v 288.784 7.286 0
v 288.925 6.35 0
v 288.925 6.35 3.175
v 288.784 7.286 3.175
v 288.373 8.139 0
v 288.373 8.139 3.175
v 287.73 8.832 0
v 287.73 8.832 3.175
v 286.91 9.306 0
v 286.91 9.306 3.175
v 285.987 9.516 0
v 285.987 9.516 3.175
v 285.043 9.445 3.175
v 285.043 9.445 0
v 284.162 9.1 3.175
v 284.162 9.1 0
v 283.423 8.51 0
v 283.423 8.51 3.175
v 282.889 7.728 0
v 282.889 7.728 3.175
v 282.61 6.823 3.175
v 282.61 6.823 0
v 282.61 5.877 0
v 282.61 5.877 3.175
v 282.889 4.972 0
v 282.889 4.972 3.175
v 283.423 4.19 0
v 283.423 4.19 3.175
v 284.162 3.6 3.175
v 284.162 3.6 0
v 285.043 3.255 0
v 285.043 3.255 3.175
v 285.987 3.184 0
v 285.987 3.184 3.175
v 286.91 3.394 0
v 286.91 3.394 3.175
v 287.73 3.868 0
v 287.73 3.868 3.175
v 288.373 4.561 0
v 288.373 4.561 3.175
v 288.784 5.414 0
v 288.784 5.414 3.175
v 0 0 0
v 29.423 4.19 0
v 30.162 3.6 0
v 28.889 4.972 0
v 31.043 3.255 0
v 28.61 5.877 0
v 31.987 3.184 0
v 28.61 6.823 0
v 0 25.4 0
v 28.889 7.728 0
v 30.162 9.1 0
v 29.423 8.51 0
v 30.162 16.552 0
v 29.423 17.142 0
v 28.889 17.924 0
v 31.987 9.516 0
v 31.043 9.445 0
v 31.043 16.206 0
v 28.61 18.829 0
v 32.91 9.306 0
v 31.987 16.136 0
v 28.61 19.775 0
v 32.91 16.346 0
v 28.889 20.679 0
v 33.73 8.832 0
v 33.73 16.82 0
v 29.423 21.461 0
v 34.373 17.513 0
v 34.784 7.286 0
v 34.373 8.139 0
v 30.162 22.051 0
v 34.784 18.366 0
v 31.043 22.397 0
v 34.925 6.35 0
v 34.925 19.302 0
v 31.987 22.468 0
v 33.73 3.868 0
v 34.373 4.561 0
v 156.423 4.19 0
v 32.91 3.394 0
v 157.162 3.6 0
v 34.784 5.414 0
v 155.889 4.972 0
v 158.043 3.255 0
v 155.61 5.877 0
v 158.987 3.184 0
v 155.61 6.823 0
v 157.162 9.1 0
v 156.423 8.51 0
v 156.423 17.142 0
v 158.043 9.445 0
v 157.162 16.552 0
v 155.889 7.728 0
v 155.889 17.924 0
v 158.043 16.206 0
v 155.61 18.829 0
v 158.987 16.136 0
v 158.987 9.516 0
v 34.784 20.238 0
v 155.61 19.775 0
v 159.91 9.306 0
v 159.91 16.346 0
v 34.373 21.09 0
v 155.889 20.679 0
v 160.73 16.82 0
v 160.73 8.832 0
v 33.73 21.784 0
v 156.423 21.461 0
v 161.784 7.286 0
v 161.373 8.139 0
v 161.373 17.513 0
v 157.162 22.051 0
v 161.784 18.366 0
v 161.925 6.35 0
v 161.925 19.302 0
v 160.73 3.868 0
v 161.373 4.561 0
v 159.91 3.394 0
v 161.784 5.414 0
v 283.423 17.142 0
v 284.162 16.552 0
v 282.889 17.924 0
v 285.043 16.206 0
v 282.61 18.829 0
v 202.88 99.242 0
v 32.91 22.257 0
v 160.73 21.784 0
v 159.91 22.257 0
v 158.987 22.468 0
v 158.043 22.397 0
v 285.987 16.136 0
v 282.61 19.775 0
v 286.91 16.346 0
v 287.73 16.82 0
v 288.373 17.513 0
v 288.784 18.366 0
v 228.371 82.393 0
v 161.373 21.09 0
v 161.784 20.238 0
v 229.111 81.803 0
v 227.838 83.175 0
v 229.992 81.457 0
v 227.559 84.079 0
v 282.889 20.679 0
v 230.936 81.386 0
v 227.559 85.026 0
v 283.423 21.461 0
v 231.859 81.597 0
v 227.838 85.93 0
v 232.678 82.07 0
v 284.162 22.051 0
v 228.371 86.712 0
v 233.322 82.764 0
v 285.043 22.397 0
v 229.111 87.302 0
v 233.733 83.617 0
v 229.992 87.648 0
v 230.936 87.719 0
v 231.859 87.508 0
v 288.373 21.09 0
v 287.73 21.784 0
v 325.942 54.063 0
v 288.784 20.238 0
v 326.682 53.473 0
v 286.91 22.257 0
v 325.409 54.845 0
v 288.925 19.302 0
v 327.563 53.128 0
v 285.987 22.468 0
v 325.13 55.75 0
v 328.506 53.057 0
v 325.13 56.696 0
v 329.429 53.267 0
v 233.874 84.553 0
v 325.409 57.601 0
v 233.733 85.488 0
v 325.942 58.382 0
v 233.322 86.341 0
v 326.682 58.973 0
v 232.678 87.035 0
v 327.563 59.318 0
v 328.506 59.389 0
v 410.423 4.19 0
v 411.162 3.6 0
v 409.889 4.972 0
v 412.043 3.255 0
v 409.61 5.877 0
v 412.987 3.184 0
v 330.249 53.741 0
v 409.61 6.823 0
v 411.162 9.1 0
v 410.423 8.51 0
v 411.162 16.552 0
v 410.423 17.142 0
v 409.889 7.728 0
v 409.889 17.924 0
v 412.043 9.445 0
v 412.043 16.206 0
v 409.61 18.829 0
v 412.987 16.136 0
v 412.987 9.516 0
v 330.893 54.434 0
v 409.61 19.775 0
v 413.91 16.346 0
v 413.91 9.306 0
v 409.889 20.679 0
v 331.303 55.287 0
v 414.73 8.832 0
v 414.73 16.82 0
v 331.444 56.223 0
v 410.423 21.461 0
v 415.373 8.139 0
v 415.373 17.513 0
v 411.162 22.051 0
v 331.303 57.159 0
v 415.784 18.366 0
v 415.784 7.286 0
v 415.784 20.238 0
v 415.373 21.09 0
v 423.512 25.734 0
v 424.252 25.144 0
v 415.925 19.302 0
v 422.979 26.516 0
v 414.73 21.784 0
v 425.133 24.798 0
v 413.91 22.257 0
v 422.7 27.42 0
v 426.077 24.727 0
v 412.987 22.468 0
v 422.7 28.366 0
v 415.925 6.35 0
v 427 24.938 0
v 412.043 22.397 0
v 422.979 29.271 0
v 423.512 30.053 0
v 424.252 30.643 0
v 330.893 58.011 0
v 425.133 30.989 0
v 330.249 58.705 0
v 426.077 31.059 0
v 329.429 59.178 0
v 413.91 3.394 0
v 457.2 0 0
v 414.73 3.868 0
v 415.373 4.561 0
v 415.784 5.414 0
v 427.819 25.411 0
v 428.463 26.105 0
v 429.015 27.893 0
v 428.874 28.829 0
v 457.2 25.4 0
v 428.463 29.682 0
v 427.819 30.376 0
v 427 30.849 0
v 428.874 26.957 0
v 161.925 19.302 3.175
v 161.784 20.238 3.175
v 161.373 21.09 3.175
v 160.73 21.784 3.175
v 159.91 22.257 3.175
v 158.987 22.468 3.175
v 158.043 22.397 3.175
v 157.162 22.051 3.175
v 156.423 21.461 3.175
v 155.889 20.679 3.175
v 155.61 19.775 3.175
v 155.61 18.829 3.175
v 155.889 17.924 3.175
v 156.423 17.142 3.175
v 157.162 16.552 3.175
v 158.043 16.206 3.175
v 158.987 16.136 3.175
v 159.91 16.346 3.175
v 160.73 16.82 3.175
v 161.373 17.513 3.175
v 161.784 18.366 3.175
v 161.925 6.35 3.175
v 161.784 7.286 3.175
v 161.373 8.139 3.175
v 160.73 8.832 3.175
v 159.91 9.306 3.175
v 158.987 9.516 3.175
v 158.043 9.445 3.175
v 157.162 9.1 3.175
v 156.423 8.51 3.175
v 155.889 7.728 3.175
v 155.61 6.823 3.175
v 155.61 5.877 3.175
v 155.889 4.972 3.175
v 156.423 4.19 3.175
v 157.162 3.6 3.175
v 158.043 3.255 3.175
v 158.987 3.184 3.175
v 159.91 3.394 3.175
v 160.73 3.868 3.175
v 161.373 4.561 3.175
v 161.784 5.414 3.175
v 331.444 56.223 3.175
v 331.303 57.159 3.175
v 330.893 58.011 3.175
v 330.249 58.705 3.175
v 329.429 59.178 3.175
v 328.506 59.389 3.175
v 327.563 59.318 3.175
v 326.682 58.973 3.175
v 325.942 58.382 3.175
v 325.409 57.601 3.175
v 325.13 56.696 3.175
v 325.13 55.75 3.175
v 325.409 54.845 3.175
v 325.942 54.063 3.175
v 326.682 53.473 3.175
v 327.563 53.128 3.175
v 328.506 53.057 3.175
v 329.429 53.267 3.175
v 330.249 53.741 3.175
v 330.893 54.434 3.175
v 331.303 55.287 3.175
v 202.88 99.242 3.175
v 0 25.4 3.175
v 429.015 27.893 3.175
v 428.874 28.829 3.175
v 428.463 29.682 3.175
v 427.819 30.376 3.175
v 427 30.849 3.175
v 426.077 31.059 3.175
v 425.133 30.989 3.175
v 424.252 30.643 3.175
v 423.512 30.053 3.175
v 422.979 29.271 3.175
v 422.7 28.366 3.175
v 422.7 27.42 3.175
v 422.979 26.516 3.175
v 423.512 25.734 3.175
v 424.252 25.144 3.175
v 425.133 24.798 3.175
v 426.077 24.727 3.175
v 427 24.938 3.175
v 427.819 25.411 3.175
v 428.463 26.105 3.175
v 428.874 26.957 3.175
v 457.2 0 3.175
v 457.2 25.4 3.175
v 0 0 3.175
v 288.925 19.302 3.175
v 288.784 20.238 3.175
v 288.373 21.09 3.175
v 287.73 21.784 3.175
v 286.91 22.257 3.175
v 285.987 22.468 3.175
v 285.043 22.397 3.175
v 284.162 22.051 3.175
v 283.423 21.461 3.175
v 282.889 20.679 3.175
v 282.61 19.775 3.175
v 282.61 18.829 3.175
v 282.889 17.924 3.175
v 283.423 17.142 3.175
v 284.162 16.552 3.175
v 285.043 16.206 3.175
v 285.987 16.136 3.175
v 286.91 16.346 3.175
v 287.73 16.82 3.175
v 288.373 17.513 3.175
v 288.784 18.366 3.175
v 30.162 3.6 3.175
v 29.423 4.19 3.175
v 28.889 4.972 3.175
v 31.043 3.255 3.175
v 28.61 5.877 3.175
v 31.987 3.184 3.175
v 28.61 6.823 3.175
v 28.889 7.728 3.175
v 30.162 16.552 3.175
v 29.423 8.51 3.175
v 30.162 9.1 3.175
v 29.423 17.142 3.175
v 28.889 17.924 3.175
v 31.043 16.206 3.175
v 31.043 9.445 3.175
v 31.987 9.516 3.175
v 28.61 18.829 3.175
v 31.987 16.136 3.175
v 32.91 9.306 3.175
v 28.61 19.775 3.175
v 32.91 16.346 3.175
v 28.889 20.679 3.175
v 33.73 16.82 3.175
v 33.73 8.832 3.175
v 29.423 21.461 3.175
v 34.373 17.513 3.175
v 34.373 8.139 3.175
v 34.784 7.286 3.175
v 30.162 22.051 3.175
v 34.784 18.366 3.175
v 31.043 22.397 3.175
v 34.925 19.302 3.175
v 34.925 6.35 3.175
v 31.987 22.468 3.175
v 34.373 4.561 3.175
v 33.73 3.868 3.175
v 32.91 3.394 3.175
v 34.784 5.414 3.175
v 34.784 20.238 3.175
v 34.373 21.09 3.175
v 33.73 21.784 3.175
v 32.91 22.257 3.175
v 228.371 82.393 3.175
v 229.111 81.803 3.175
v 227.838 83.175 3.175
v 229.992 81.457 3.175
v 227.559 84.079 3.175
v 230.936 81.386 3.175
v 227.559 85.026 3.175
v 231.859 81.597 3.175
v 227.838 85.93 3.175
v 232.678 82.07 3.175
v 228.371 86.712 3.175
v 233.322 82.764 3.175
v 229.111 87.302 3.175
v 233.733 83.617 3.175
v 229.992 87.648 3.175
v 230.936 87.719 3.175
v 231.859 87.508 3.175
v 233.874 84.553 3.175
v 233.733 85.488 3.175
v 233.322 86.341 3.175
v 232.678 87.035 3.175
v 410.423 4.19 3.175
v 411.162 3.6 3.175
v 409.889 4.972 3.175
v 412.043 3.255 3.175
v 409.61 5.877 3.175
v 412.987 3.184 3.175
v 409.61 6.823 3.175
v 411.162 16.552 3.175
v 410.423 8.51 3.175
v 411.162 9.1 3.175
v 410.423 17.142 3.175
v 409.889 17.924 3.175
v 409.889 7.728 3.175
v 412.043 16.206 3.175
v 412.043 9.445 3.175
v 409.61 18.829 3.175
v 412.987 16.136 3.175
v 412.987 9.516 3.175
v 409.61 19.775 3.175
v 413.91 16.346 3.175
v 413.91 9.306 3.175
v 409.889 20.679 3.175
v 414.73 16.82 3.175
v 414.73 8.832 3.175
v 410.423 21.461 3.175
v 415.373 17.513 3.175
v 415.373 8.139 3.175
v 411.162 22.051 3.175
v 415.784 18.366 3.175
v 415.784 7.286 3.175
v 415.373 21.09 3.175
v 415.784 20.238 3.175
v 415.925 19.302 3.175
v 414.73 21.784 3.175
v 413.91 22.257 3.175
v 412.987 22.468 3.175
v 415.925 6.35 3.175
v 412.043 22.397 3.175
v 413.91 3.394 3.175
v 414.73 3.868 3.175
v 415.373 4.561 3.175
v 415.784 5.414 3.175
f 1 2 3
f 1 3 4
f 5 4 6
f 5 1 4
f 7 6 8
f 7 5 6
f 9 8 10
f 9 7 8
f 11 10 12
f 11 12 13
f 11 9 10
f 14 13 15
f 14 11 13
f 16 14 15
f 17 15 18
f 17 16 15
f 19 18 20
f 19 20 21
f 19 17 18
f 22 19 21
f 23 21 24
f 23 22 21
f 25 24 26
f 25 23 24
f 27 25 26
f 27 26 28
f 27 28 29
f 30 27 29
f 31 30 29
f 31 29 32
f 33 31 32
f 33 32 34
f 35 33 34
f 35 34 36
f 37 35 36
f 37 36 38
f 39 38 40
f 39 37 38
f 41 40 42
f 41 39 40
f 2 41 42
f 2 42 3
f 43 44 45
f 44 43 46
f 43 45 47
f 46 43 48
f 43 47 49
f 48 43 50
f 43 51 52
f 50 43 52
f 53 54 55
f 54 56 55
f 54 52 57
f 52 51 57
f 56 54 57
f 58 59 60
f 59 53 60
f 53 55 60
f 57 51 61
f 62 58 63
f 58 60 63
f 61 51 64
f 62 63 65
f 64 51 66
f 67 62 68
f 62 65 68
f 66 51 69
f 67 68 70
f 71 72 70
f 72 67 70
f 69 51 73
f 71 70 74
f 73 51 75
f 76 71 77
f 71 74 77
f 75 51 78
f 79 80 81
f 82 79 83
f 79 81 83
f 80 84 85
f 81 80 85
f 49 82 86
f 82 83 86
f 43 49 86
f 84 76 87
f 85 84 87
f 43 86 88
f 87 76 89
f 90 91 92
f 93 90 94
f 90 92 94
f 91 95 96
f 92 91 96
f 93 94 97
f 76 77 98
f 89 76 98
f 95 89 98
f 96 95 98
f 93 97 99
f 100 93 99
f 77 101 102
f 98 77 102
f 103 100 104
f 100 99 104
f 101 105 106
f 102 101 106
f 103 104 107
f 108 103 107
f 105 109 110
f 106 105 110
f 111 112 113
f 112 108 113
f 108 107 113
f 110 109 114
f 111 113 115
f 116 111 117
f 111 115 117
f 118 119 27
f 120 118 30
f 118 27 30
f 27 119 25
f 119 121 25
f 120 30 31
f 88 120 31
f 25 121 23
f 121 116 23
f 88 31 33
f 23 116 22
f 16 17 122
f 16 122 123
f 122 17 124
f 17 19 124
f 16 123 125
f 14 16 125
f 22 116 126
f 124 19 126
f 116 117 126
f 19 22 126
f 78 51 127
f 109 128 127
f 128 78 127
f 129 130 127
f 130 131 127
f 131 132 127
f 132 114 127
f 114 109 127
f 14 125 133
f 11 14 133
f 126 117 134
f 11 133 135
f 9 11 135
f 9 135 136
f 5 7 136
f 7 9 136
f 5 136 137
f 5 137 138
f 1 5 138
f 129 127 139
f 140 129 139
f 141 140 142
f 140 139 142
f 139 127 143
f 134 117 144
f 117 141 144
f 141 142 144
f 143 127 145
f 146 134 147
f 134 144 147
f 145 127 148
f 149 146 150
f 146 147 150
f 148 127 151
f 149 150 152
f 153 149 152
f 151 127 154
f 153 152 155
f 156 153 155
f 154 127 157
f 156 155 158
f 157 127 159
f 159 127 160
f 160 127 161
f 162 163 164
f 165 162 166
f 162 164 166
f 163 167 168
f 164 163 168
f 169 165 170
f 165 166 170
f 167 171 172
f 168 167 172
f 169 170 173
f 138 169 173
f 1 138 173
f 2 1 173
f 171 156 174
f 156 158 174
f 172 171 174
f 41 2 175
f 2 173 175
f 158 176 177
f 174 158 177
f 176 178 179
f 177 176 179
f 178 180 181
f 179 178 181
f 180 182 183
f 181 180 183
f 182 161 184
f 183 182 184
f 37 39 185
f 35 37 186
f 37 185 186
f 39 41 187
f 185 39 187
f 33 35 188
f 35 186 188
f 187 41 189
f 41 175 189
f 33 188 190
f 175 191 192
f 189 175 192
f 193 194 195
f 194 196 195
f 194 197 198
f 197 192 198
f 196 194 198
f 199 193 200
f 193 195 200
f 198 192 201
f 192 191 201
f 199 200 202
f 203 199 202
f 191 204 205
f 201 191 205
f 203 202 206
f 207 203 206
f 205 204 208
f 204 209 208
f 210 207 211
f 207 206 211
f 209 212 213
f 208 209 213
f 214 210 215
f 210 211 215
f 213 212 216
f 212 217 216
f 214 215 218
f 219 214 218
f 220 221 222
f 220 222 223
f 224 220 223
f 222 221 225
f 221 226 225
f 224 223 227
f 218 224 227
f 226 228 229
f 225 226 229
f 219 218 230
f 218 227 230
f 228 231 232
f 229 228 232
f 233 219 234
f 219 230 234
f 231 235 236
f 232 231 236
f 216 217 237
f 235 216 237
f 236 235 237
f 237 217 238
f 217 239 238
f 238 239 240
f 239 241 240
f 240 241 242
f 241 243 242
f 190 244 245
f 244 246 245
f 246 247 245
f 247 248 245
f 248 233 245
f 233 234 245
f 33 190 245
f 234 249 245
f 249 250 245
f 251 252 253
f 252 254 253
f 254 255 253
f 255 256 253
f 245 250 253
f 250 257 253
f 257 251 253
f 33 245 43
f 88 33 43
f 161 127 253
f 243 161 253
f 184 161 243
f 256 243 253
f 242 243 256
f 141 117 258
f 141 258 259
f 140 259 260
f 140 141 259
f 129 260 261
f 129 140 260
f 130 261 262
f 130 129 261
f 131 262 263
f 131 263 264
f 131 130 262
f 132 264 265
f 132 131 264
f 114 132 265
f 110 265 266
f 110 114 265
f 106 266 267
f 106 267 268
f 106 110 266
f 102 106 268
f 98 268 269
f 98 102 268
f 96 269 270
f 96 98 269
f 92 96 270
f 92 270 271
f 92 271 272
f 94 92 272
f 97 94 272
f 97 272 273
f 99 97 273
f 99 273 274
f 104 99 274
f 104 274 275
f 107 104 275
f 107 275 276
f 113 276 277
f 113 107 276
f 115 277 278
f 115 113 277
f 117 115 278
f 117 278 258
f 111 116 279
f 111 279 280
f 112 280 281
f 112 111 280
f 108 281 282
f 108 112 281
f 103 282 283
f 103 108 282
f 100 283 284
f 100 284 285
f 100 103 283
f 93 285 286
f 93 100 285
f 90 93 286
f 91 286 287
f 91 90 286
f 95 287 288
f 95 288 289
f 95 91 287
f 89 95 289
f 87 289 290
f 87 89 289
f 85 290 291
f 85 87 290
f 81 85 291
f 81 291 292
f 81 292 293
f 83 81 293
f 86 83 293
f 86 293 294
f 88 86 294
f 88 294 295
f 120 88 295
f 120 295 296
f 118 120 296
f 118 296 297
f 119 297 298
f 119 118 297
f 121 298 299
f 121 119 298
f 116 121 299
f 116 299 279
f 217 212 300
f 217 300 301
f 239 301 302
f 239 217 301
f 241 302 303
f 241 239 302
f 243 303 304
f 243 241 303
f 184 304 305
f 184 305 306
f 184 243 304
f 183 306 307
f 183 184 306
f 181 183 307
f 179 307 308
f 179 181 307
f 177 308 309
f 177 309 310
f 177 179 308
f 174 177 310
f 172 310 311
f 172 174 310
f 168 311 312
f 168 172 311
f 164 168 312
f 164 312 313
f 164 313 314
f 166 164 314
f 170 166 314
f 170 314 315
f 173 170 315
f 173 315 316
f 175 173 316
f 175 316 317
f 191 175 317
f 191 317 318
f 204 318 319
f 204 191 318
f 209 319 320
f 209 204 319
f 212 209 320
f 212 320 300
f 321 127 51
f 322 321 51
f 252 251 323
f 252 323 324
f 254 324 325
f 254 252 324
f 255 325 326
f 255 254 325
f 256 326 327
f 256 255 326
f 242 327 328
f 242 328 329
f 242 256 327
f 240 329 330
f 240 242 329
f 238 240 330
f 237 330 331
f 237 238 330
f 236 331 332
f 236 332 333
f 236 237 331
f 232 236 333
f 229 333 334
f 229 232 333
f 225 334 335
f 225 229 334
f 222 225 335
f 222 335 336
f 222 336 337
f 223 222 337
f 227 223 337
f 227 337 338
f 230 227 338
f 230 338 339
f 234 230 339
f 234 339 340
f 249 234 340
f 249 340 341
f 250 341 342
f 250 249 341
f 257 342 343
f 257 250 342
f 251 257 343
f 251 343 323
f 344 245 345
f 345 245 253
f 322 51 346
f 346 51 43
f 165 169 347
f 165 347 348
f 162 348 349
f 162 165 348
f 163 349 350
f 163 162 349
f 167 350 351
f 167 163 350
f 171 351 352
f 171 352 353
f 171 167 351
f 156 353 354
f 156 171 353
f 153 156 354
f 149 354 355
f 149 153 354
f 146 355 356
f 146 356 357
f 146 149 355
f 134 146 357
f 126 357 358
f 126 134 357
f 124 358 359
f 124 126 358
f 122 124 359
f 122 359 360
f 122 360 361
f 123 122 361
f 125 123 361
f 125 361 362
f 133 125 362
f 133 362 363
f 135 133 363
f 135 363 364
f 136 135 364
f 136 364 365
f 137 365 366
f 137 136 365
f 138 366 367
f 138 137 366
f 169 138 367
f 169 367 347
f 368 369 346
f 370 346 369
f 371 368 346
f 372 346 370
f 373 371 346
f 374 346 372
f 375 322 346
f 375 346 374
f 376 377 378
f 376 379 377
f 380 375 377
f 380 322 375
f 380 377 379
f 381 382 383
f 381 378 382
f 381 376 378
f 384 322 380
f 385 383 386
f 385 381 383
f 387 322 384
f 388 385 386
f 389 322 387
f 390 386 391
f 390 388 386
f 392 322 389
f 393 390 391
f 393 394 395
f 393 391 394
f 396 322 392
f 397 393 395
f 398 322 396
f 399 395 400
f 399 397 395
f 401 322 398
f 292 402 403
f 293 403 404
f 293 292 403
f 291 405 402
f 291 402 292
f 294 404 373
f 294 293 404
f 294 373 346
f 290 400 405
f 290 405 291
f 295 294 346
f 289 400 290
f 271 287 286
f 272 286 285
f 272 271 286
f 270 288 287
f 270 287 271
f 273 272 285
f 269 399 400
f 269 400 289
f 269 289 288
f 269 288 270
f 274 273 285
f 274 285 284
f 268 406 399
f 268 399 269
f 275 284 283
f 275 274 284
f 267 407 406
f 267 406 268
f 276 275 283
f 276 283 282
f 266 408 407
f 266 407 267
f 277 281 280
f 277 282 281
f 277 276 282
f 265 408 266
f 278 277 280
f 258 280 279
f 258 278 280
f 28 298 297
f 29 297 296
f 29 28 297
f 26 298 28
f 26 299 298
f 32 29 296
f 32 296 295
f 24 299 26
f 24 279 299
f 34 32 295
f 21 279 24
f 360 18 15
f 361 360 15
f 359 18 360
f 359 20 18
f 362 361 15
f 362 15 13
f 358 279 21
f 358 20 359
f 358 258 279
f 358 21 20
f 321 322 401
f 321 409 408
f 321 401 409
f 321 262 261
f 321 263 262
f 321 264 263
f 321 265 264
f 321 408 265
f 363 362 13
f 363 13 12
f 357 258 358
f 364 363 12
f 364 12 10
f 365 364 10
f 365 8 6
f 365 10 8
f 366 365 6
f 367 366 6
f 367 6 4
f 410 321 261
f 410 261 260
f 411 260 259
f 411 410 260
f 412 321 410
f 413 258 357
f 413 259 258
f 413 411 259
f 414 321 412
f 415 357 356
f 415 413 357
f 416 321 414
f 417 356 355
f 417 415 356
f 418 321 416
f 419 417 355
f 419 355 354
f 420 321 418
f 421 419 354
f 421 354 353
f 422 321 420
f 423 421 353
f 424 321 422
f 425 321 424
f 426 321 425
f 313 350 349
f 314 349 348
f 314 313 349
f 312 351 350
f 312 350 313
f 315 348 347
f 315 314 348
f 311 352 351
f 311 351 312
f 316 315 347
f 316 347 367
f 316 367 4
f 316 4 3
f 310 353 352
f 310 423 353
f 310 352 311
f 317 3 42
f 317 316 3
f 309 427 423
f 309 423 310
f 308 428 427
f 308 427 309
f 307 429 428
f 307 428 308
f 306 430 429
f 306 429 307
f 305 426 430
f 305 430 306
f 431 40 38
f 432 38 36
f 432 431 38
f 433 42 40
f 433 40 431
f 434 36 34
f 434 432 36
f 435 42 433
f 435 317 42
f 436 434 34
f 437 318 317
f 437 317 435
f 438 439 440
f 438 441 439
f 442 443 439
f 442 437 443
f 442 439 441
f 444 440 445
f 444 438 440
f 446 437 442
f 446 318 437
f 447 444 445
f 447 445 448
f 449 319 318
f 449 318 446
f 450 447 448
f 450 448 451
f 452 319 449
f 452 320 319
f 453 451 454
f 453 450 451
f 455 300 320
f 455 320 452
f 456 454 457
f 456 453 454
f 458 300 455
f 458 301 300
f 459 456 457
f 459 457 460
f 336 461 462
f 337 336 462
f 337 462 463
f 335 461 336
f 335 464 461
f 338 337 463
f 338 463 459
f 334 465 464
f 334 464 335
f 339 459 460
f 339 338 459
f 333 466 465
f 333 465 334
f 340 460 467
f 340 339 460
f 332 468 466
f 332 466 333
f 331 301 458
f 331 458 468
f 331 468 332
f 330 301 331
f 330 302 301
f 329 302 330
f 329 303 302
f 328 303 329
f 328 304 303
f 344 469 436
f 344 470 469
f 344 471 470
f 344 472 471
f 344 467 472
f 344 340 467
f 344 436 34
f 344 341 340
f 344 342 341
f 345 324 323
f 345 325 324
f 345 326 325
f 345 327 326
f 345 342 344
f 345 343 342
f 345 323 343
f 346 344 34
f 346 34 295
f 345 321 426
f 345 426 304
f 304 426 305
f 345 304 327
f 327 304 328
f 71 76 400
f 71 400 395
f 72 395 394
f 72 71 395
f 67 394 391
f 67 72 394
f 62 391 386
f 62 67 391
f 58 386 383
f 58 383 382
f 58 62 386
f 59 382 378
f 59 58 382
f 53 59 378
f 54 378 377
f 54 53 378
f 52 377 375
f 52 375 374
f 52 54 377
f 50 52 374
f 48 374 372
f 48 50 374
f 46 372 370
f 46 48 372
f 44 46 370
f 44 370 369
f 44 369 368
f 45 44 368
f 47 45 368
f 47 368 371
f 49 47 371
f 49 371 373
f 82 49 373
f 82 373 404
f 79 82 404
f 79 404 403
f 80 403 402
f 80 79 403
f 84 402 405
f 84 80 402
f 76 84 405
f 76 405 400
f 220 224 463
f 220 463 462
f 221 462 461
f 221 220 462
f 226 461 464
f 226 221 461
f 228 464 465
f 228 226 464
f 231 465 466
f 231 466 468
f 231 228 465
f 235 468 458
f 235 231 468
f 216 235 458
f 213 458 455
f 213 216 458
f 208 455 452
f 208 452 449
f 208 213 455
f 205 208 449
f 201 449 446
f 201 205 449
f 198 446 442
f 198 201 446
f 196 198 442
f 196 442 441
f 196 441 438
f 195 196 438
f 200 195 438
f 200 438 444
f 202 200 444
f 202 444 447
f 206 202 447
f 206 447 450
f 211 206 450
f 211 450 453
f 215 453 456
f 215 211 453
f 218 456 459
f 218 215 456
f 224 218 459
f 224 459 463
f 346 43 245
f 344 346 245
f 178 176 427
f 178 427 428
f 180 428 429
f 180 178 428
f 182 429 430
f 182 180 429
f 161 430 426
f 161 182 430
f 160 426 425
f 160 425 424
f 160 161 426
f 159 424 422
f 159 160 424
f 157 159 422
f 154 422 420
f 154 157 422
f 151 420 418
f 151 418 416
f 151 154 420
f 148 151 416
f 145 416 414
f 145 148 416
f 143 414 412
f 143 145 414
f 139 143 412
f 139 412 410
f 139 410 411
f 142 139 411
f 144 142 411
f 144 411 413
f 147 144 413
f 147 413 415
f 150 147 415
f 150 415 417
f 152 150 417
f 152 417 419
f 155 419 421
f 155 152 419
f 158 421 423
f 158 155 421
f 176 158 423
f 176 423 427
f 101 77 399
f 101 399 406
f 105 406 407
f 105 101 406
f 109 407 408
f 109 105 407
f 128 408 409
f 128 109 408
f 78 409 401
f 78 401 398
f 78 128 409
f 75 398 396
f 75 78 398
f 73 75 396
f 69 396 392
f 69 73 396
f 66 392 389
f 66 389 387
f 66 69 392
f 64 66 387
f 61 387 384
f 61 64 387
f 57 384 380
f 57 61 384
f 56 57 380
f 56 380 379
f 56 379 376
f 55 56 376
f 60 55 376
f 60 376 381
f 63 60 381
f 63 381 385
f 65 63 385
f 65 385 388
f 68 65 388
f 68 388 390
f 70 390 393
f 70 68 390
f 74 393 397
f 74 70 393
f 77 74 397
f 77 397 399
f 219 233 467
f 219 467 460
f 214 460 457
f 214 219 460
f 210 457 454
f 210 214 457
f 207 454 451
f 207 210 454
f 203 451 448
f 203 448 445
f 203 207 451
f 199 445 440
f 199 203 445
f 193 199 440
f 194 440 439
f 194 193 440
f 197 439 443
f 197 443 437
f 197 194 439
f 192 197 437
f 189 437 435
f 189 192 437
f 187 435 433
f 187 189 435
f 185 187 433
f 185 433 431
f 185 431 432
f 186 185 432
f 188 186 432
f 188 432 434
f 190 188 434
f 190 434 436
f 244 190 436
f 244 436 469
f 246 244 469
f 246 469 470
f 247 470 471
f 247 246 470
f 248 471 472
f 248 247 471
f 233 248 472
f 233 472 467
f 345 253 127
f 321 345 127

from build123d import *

# Parameters (mm, degrees)
SKETCH1_R           = 3.175
BOSS_EXTRUDE1_DEPTH = 3.175


with BuildPart() as part:
    # Sketch1 → Boss-Extrude1 (new body)
    with BuildSketch(Plane.XY):
        Polygon((0, 0), (457.2, 0), (457.2, 25.4), (202.879636828, 99.242148944), (0, 25.4), align=None)
        with Locations((230.698777852, 84.552587242)):
            Circle(SKETCH1_R, mode=Mode.SUBTRACT)
        with Locations((328.269214348, 56.222922191)):
            Circle(SKETCH1_R, mode=Mode.SUBTRACT)
        with Locations((425.839650845, 27.89325714)):
            Circle(SKETCH1_R, mode=Mode.SUBTRACT)
        with Locations((31.75, 19.301847719)):
            Circle(SKETCH1_R, mode=Mode.SUBTRACT)
        with Locations((31.75, 6.35)):
            Circle(SKETCH1_R, mode=Mode.SUBTRACT)
        with Locations((158.75, 19.301847719)):
            Circle(SKETCH1_R, mode=Mode.SUBTRACT)
        with Locations((285.75, 19.301847719)):
            Circle(SKETCH1_R, mode=Mode.SUBTRACT)
        with Locations((412.75, 19.301847719)):
            Circle(SKETCH1_R, mode=Mode.SUBTRACT)
        with Locations((158.75, 6.35)):
            Circle(SKETCH1_R, mode=Mode.SUBTRACT)
        with Locations((285.75, 6.35)):
            Circle(SKETCH1_R, mode=Mode.SUBTRACT)
        with Locations((412.75, 6.35)):
            Circle(SKETCH1_R, mode=Mode.SUBTRACT)
    extrude(amount=BOSS_EXTRUDE1_DEPTH)


solid = part.part
